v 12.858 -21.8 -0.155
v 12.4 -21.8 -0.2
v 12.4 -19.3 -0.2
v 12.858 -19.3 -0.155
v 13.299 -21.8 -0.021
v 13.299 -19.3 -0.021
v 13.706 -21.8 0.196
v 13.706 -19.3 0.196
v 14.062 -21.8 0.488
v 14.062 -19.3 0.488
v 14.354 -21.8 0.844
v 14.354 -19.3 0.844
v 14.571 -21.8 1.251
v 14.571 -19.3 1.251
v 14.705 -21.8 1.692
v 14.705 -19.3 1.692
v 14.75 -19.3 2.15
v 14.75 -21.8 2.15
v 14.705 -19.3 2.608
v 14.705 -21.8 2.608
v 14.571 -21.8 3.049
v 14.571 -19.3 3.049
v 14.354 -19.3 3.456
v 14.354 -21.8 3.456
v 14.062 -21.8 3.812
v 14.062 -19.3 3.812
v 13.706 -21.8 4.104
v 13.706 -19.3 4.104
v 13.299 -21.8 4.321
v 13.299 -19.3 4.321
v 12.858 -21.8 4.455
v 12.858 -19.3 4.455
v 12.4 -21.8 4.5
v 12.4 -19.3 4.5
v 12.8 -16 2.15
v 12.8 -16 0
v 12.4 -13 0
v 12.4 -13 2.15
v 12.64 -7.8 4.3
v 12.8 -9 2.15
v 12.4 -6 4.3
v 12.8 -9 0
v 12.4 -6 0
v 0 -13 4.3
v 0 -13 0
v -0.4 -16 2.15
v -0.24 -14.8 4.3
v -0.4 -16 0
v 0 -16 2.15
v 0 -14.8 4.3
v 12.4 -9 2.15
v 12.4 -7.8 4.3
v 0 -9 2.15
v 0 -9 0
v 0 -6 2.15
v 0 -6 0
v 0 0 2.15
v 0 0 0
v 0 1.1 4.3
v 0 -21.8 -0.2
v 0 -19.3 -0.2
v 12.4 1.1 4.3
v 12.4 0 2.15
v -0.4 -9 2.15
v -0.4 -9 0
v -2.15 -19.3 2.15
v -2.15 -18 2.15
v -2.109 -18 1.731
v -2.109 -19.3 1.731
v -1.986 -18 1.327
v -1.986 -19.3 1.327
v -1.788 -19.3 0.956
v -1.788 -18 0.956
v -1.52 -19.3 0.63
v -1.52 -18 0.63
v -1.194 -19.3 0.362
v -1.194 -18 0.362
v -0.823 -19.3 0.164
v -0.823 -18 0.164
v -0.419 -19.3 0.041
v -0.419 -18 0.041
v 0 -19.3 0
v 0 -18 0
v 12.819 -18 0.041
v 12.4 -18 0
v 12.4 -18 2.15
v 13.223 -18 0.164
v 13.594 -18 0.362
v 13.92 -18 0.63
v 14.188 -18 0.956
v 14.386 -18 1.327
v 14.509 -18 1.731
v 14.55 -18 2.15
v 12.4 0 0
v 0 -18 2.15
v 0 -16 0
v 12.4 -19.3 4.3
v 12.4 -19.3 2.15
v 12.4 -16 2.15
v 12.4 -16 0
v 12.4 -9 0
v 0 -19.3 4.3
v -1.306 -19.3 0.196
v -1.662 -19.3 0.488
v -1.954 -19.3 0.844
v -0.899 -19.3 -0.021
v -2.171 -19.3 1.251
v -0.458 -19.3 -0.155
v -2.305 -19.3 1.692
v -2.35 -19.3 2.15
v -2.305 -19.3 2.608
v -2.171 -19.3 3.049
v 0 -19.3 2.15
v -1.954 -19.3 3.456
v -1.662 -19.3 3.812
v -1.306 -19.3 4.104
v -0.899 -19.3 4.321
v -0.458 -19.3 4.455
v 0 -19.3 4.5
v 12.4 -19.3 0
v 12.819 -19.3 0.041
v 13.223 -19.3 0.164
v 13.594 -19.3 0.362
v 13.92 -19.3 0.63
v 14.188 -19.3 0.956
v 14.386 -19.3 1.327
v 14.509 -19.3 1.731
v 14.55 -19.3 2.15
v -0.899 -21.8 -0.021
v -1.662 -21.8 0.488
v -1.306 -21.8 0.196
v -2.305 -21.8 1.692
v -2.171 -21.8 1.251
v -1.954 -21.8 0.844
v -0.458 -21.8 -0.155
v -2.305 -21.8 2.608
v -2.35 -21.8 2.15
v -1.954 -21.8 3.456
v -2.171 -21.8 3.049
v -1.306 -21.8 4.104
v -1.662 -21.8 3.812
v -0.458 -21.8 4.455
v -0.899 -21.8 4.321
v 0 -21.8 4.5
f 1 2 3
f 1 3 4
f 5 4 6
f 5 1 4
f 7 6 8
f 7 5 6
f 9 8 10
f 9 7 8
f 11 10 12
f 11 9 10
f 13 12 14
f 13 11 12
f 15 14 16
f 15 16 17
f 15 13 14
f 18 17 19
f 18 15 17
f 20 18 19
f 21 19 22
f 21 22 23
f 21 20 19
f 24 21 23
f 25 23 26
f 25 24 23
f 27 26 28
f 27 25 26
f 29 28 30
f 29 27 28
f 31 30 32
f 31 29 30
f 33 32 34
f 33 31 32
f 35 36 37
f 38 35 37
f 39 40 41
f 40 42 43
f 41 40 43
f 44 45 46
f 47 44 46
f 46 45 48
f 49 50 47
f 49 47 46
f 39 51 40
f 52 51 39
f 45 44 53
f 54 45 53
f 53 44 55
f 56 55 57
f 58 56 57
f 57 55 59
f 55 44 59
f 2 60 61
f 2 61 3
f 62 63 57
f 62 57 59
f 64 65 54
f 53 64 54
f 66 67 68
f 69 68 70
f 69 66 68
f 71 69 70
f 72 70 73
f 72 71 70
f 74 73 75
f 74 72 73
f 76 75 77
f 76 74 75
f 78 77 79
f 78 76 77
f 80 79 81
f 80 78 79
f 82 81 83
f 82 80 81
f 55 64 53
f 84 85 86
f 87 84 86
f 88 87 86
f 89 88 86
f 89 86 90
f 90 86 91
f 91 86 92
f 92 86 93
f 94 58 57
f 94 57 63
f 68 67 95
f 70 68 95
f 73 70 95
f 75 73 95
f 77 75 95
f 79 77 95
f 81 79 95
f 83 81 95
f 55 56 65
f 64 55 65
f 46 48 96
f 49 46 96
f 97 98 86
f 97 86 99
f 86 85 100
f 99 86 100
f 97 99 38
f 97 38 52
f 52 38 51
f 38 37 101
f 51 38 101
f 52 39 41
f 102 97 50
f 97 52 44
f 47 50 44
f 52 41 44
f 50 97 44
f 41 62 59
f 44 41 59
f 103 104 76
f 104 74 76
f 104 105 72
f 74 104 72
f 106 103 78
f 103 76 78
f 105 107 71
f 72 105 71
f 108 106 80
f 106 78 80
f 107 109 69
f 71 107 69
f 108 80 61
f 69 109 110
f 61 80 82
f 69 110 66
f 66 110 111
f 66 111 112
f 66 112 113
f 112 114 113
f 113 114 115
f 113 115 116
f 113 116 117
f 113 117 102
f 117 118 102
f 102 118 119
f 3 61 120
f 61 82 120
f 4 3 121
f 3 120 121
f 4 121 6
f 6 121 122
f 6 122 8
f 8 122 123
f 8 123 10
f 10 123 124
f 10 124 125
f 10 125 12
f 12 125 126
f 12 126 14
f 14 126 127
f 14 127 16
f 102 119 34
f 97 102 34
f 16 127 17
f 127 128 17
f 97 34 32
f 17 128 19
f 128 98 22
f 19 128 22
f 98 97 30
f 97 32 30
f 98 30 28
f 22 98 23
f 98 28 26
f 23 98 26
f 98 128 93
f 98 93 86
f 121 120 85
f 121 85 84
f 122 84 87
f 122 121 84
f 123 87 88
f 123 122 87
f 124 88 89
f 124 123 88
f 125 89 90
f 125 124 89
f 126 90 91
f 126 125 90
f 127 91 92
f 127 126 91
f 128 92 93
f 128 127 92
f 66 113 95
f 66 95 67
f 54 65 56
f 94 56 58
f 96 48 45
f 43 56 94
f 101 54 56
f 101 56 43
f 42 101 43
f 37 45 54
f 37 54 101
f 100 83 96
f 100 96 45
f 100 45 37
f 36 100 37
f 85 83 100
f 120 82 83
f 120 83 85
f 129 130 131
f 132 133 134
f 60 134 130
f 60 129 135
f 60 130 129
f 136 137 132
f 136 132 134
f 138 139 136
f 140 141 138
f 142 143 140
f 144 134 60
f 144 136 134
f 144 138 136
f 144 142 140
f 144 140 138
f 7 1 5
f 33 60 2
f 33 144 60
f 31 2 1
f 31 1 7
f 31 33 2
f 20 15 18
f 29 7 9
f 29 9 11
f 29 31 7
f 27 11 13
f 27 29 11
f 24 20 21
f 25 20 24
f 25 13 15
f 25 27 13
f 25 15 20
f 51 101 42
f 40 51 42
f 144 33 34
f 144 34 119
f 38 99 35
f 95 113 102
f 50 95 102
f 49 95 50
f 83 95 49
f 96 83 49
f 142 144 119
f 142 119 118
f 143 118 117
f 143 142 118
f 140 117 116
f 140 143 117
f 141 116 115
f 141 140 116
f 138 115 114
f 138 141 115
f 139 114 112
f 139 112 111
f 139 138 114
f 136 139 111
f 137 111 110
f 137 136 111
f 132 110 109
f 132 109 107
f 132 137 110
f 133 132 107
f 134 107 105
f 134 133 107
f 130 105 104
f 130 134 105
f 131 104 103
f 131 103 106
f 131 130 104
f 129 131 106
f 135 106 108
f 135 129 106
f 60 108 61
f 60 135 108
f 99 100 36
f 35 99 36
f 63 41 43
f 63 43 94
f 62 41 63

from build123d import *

# Parameters (mm, degrees)
F1_DEPTH  = 2.15
F2_W      = 12.4
F2_H      = 19.3
F3_DEPTH  = 2.15
F4_DEPTH  = 2.15
F6_DEPTH  = 25
F7_DEPTH  = 2.15
F9_DEPTH  = 25
F11_DEPTH = 12.4
F13_DEPTH = 2.5
F14_DEPTH = 1.3
F16_DEPTH = 2.5


with BuildPart() as f1:
    # F0 (on Top) → F1 (new body)
    with BuildSketch(Plane.XY):
        Polygon((12.4, 0), (0, 0), (0, -6), (0, -9), (6.2, -9), (12.4, -9), (12.4, -6), align=None)
        Polygon((0, -9), (0, -6), (-0.4, -9), align=None)
        Polygon((12.8, -9), (12.4, -6), (12.4, -9), align=None)
        Polygon((6.2, -9), (0, -9), (0, -13), (0, -16), (6.2, -16), (12.4, -16), (12.4, -13), (12.4, -9), align=None)
        Polygon((0, -16), (0, -13), (-0.4, -16), align=None)
        Polygon((12.8, -16), (12.4, -13), (12.4, -16), align=None)
        Polygon((6.2, -16), (0, -16), (0, -18), (12.4, -18), (12.4, -16), align=None)
    extrude(amount=F1_DEPTH)

    # F2 (on face) → F3 (join)
    with BuildSketch(Plane.XY.offset(2.15)):
        with Locations((6.2, -9.65)):
            Rectangle(F2_W, F2_H)
    extrude(amount=F3_DEPTH)

    # F4 (add): a face of the model
    f4_faces = [f1.faces().sort_by_distance(p)[0] for p in [
        (12.5333333333, -8, 2.15),
    ]]
    extrude(f4_faces, amount=F4_DEPTH)

    # F5 (on face) → F6 (cut)
    with BuildSketch(Plane.YZ.offset(12.4)):
        Polygon((-9, 4.3), (-9, 2.15), (-7.8, 4.3), align=None)
    extrude(amount=F6_DEPTH, mode=Mode.SUBTRACT)

    # F7 (add): a face of the model
    f7_faces = [f1.faces().sort_by_distance(p)[0] for p in [
        (-0.1333333333, -15, 2.15),
    ]]
    extrude(f7_faces, amount=F7_DEPTH)

    # F8 (on face) → F9 (cut)
    with BuildSketch(Plane(origin=(0, 0, 0), x_dir=(0, -1, 0), z_dir=(-1, 0, 0))):
        Polygon((14.8, 4.3), (16, 2.15), (16, 4.3), align=None)
    extrude(amount=F9_DEPTH, mode=Mode.SUBTRACT)

    # F10 (on face) → F11 (join, through all)
    with BuildSketch(Plane.YZ.offset(12.4)):
        Polygon((1.1, 4.3), (0, 4.3), (0, 2.15), align=None)
    extrude(amount=-F11_DEPTH)

    # F12 (on face) → F13 (join)
    with BuildSketch(Plane.XZ.offset(19.3)):
        with BuildLine():
            Line((0, 2.15), (2.15, 2.15))
            ThreePointArc((2.15, 2.15), (0, 4.3), (-2.15, 2.15))
            Line((-2.15, 2.15), (0, 2.15))
        make_face()
        with BuildLine():
            Line((10.25, 2.15), (2.15, 2.15))
            ThreePointArc((2.15, 2.15), (1.5202795796, 0.6297204204), (0, 0))
            Line((0, 0), (12.4, 0))
            ThreePointArc((12.4, 0), (10.8797204204, 0.6297204204), (10.25, 2.15))
        make_face()
        with BuildLine():
            ThreePointArc((0, 0), (1.5202795796, 0.6297204204), (2.15, 2.15))
            Line((2.15, 2.15), (0, 2.15))
            Line((0, 2.15), (-2.15, 2.15))
            ThreePointArc((-2.15, 2.15), (-1.5202795796, 0.6297204204), (0, 0))
        make_face()
        with BuildLine():
            Line((12.4, 2.15), (10.25, 2.15))
            ThreePointArc((10.25, 2.15), (10.8797204204, 0.6297204204), (12.4, 0))
            ThreePointArc((12.4, 0), (13.9202795796, 0.6297204204), (14.55, 2.15))
            Line((14.55, 2.15), (12.4, 2.15))
        make_face()
        with BuildLine():
            ThreePointArc((14.55, 2.15), (12.4, 4.3), (10.25, 2.15))
            Line((10.25, 2.15), (12.4, 2.15))
            Line((12.4, 2.15), (14.55, 2.15))
        make_face()
        with BuildLine():
            ThreePointArc((0, 4.3), (1.5202795796, 3.6702795796), (2.15, 2.15))
            Line((2.15, 2.15), (10.25, 2.15))
            ThreePointArc((10.25, 2.15), (10.8797204204, 3.6702795796), (12.4, 4.3))
            Line((12.4, 4.3), (0, 4.3))
        make_face()
    extrude(amount=F13_DEPTH)

    # F12 (on face) → F14 (join)
    with BuildSketch(Plane.XZ.offset(19.3)):
        with BuildLine():
            ThreePointArc((0, 0), (1.5202795796, 0.6297204204), (2.15, 2.15))
            Line((2.15, 2.15), (0, 2.15))
            Line((0, 2.15), (-2.15, 2.15))
            ThreePointArc((-2.15, 2.15), (-1.5202795796, 0.6297204204), (0, 0))
        make_face()
        with BuildLine():
            Line((10.25, 2.15), (2.15, 2.15))
            ThreePointArc((2.15, 2.15), (1.5202795796, 0.6297204204), (0, 0))
            Line((0, 0), (12.4, 0))
            ThreePointArc((12.4, 0), (10.8797204204, 0.6297204204), (10.25, 2.15))
        make_face()
        with BuildLine():
            Line((12.4, 2.15), (10.25, 2.15))
            ThreePointArc((10.25, 2.15), (10.8797204204, 0.6297204204), (12.4, 0))
            ThreePointArc((12.4, 0), (13.9202795796, 0.6297204204), (14.55, 2.15))
            Line((14.55, 2.15), (12.4, 2.15))
        make_face()
    extrude(amount=-F14_DEPTH)

    # F15 (on face) → F16 (join)
    with BuildSketch(Plane.XZ.offset(21.8)):
        with BuildLine():
            ThreePointArc((12.4, -0.2), (14.75, 2.15), (12.4, 4.5))
            Line((12.4, 4.5), (0, 4.5))
            ThreePointArc((0, 4.5), (-2.35, 2.15), (0, -0.2))
            Line((0, -0.2), (12.4, -0.2))
        make_face()
    extrude(amount=-F16_DEPTH)


solid = f1.part
